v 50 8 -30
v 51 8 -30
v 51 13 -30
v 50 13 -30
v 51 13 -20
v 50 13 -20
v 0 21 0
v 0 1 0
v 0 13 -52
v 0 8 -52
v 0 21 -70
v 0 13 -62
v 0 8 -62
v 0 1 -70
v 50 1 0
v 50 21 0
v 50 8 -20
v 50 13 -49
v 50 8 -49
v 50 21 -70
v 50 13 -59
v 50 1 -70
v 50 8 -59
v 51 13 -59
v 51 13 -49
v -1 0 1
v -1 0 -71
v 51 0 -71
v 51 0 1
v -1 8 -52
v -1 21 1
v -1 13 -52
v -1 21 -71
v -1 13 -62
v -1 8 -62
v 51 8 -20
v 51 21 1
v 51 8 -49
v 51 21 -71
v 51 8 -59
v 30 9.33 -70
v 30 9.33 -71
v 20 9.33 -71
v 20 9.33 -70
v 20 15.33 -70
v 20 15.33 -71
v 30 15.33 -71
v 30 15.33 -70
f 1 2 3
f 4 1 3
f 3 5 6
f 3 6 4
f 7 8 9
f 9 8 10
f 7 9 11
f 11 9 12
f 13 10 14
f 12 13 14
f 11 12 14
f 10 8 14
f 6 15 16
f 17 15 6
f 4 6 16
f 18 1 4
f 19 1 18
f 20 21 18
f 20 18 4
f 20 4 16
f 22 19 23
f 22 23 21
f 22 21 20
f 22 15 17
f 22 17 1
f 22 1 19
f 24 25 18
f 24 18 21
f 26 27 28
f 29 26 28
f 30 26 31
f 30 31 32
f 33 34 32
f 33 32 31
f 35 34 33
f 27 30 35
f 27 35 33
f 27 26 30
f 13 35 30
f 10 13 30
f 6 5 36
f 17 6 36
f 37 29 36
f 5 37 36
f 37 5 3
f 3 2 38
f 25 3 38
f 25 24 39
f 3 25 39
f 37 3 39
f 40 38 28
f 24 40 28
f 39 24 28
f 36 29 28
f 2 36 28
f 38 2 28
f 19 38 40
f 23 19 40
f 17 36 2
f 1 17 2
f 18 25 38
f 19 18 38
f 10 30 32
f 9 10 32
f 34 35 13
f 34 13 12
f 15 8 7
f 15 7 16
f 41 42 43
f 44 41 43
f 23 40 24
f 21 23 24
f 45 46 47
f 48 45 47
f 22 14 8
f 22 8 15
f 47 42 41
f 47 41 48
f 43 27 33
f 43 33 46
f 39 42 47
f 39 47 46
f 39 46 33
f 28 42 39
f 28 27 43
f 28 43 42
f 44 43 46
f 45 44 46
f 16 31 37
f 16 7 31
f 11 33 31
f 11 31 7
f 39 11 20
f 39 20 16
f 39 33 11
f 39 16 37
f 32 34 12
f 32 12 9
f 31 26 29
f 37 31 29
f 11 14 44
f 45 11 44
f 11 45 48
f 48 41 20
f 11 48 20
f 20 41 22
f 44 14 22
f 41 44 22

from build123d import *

# Parameters (mm, degrees)
CROQUIS1_W              = 50
CROQUIS1_H              = 70
SALIENTE_EXTRUIR1_DEPTH = 1
CROQUIS1_3_W            = 52
CROQUIS1_3_H            = 72
CROQUIS1_3_W_2          = 50
CROQUIS1_3_H_2          = 70
SALIENTE_EXTRUIR2_DEPTH = 21
CROQUIS3_W              = 10
CROQUIS3_H              = 6
CORTAR_EXTRUIR1_DEPTH   = 21
CROQUIS4_W              = 10
CROQUIS4_H              = 5
CORTAR_EXTRUIR3_DEPTH   = 29
CROQUIS5_W              = 10
CROQUIS5_H              = 5
CORTAR_EXTRUIR4_DEPTH   = 29


with BuildPart() as part:
    # Croquis1 → Saliente-Extruir1 (new body)
    with BuildSketch(Plane(origin=(0, 0, 0), x_dir=(1, 0, 0), z_dir=(0, 1, 0))):
        with Locations((25, 35)):
            Rectangle(CROQUIS1_W, CROQUIS1_H)
    extrude(amount=SALIENTE_EXTRUIR1_DEPTH)

    # Croquis1<3> → Saliente-Extruir2 (add)
    with BuildSketch(Plane(origin=(0, 0, 0), x_dir=(1, 0, 0), z_dir=(0, 1, 0))):
        with Locations((25, 35)):
            Rectangle(CROQUIS1_3_W, CROQUIS1_3_H)
        with Locations((25, 35)):
            Rectangle(CROQUIS1_3_W_2, CROQUIS1_3_H_2, mode=Mode.SUBTRACT)
    extrude(amount=SALIENTE_EXTRUIR2_DEPTH)

    # Croquis3 → Cortar-Extruir1 (cut)
    with BuildSketch(Plane(origin=(0, 0, -71), x_dir=(-1, 0, 0), z_dir=(0, 0, -1))):
        with Locations((-25, 12.33)):
            Rectangle(CROQUIS3_W, CROQUIS3_H)
    extrude(amount=-CORTAR_EXTRUIR1_DEPTH, mode=Mode.SUBTRACT)

    # Croquis4 → Cortar-Extruir3 (cut)
    with BuildSketch(Plane(origin=(51, 0, 0), x_dir=(0, 0, -1), z_dir=(1, 0, 0))):
        with Locations((25, 10.5)):
            Rectangle(CROQUIS4_W, CROQUIS4_H)
        with Locations((54, 10.5)):
            Rectangle(CROQUIS4_W, CROQUIS4_H)
    extrude(amount=-CORTAR_EXTRUIR3_DEPTH, mode=Mode.SUBTRACT)

    # Croquis5 → Cortar-Extruir4 (cut)
    with BuildSketch(Plane.ZY.offset(1)):
        with Locations((-57, 10.5)):
            Rectangle(CROQUIS5_W, CROQUIS5_H)
    extrude(amount=-CORTAR_EXTRUIR4_DEPTH, mode=Mode.SUBTRACT)


solid = part.part
